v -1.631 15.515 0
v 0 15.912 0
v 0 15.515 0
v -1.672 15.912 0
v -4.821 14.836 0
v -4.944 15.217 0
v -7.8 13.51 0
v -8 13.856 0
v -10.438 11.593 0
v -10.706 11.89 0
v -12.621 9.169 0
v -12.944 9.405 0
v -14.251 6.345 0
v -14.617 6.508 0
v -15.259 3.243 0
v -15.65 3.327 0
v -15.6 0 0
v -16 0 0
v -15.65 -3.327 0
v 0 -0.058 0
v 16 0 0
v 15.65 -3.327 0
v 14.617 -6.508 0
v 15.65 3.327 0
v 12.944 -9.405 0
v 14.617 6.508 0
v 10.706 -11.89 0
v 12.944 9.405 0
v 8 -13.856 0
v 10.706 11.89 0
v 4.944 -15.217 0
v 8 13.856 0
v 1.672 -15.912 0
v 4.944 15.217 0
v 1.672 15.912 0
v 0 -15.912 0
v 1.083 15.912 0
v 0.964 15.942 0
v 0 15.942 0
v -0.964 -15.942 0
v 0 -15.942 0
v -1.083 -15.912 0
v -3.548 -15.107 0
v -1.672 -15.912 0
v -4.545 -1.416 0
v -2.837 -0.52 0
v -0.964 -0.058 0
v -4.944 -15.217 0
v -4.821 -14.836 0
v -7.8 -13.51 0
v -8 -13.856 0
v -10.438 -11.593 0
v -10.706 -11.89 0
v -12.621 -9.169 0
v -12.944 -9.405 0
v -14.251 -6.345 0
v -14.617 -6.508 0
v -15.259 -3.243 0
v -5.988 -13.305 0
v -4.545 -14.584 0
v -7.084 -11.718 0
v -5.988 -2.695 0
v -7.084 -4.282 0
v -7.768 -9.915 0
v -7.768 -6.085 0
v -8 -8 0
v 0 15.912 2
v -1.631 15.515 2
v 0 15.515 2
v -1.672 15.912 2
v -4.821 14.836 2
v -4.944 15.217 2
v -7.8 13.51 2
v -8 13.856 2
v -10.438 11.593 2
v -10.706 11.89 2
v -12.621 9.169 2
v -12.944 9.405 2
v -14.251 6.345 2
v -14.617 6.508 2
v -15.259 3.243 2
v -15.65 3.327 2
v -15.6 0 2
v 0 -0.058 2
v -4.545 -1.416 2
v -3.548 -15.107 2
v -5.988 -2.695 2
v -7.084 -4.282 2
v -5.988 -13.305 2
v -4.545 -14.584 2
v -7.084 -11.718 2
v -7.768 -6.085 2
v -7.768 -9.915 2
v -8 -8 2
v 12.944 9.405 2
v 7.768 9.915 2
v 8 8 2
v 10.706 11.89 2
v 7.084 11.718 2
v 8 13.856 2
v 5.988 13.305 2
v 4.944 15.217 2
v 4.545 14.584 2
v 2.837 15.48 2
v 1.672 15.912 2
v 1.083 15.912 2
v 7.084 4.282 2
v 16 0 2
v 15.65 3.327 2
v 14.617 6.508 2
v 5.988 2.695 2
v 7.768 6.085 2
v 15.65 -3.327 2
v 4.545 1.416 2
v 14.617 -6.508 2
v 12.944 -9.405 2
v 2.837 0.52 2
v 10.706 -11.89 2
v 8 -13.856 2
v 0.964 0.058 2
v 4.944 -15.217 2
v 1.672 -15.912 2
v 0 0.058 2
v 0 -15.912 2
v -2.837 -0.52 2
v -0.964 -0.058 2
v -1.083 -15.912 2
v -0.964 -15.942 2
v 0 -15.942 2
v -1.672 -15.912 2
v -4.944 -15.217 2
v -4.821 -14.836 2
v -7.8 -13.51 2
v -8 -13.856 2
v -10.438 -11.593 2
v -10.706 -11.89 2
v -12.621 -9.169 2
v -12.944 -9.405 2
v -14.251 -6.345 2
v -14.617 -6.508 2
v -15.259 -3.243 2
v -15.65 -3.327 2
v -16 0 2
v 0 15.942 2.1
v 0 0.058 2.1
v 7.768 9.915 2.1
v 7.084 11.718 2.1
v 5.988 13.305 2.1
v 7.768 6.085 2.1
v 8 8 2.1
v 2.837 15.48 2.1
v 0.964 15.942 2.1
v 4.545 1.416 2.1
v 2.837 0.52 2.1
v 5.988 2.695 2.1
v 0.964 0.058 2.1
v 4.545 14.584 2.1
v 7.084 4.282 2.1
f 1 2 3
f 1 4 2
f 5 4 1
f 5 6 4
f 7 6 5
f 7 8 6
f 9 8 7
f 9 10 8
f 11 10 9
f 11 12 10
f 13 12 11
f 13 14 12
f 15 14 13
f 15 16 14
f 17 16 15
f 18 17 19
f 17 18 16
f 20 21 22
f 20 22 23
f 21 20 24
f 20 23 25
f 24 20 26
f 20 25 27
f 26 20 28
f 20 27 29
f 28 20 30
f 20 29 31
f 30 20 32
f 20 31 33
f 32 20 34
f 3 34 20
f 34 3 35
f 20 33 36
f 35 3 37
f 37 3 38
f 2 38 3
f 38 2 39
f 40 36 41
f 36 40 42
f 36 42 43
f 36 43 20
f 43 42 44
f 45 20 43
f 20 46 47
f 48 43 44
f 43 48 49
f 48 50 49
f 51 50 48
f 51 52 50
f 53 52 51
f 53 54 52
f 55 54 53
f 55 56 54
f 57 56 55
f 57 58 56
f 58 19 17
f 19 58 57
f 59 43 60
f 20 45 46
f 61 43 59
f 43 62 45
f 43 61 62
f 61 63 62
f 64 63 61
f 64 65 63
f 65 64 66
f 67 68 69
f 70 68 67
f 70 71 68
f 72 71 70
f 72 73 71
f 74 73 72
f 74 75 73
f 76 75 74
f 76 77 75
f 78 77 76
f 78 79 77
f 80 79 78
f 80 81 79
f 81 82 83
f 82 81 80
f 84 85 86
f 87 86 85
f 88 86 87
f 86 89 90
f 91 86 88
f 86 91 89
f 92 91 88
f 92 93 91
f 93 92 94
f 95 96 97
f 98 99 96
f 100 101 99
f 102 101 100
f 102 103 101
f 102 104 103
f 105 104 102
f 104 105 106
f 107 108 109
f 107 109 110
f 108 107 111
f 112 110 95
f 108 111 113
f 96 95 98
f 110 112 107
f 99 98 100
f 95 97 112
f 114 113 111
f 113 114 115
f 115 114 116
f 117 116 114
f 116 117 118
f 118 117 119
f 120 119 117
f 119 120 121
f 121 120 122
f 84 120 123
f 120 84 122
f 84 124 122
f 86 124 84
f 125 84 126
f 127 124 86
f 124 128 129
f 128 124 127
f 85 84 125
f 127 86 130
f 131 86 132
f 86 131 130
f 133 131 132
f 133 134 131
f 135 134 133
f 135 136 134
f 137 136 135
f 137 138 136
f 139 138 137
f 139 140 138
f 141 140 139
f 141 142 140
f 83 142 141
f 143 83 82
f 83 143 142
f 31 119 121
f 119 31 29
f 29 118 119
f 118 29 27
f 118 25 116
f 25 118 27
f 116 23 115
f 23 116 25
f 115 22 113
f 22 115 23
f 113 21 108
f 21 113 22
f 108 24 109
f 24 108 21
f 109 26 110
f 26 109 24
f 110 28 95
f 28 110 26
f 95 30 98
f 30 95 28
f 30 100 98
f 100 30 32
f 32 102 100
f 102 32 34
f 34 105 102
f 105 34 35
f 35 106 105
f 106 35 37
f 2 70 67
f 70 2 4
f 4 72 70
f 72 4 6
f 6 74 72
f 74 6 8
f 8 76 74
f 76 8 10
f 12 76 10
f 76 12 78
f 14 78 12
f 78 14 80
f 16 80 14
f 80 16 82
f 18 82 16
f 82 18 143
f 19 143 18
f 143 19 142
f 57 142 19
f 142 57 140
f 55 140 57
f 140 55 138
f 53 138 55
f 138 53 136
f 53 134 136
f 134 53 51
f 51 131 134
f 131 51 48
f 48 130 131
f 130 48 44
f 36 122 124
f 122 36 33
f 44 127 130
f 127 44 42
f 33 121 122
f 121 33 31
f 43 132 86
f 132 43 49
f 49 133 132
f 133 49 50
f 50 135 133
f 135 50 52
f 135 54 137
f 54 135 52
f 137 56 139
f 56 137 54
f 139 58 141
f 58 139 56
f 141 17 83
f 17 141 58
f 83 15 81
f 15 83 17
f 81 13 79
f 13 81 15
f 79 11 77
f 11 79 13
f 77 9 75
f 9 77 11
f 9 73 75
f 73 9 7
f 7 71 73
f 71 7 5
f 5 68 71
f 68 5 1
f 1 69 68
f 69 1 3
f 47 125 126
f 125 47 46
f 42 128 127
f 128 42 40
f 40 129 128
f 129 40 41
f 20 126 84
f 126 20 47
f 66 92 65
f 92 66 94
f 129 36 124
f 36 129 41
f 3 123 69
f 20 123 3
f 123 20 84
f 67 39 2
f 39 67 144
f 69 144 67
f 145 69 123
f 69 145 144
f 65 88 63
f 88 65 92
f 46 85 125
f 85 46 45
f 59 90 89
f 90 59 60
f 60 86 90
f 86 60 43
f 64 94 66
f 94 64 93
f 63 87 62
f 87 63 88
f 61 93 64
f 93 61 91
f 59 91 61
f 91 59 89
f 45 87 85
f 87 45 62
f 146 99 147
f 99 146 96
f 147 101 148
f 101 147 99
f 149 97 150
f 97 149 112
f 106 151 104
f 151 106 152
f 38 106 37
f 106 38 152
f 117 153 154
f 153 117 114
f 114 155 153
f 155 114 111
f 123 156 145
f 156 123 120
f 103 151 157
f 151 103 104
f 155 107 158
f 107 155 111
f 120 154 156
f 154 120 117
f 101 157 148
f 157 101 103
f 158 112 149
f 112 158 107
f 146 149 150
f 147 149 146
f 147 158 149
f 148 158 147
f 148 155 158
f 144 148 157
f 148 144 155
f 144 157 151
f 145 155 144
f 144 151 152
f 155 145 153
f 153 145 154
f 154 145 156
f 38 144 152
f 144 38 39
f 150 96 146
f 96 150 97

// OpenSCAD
mooncake_radius = 40;
height = 2;

module taiji() {
    r = mooncake_radius * 0.4;
    large_circle_radius = r;
    small_circle_radius = r / 2;
    
    // 外圆轮廓
    linear_extrude(height = height) {
        difference(){
            circle(r = large_circle_radius);
            circle(r = large_circle_radius-0.4);
        }
    }
    
    // 左半圆（绿色）
    color("green",0.5) 
    linear_extrude(height = height) {
        translate([0, -small_circle_radius])
        intersection() {
            circle(r = small_circle_radius);
            translate([-small_circle_radius, 0])
            square([small_circle_radius * 2, small_circle_radius * 2], center = true);
        }
        // 大圆的后半部分
       
    }
    
    // 右半圆（红色）
    color("red",0.5)
    linear_extrude(height = height+0.1) {
        translate([0, small_circle_radius])
        intersection() {
            circle(r = small_circle_radius);
            translate([small_circle_radius, 0])
            square([small_circle_radius * 2, small_circle_radius * 2], center = true);
        }
    }
    linear_extrude(height = height) {
         intersection() {
            circle(r = large_circle_radius);
            translate([large_circle_radius, 0])
            square([large_circle_radius * 2, large_circle_radius * 2], center = true);
        }
    }
}

taiji();
